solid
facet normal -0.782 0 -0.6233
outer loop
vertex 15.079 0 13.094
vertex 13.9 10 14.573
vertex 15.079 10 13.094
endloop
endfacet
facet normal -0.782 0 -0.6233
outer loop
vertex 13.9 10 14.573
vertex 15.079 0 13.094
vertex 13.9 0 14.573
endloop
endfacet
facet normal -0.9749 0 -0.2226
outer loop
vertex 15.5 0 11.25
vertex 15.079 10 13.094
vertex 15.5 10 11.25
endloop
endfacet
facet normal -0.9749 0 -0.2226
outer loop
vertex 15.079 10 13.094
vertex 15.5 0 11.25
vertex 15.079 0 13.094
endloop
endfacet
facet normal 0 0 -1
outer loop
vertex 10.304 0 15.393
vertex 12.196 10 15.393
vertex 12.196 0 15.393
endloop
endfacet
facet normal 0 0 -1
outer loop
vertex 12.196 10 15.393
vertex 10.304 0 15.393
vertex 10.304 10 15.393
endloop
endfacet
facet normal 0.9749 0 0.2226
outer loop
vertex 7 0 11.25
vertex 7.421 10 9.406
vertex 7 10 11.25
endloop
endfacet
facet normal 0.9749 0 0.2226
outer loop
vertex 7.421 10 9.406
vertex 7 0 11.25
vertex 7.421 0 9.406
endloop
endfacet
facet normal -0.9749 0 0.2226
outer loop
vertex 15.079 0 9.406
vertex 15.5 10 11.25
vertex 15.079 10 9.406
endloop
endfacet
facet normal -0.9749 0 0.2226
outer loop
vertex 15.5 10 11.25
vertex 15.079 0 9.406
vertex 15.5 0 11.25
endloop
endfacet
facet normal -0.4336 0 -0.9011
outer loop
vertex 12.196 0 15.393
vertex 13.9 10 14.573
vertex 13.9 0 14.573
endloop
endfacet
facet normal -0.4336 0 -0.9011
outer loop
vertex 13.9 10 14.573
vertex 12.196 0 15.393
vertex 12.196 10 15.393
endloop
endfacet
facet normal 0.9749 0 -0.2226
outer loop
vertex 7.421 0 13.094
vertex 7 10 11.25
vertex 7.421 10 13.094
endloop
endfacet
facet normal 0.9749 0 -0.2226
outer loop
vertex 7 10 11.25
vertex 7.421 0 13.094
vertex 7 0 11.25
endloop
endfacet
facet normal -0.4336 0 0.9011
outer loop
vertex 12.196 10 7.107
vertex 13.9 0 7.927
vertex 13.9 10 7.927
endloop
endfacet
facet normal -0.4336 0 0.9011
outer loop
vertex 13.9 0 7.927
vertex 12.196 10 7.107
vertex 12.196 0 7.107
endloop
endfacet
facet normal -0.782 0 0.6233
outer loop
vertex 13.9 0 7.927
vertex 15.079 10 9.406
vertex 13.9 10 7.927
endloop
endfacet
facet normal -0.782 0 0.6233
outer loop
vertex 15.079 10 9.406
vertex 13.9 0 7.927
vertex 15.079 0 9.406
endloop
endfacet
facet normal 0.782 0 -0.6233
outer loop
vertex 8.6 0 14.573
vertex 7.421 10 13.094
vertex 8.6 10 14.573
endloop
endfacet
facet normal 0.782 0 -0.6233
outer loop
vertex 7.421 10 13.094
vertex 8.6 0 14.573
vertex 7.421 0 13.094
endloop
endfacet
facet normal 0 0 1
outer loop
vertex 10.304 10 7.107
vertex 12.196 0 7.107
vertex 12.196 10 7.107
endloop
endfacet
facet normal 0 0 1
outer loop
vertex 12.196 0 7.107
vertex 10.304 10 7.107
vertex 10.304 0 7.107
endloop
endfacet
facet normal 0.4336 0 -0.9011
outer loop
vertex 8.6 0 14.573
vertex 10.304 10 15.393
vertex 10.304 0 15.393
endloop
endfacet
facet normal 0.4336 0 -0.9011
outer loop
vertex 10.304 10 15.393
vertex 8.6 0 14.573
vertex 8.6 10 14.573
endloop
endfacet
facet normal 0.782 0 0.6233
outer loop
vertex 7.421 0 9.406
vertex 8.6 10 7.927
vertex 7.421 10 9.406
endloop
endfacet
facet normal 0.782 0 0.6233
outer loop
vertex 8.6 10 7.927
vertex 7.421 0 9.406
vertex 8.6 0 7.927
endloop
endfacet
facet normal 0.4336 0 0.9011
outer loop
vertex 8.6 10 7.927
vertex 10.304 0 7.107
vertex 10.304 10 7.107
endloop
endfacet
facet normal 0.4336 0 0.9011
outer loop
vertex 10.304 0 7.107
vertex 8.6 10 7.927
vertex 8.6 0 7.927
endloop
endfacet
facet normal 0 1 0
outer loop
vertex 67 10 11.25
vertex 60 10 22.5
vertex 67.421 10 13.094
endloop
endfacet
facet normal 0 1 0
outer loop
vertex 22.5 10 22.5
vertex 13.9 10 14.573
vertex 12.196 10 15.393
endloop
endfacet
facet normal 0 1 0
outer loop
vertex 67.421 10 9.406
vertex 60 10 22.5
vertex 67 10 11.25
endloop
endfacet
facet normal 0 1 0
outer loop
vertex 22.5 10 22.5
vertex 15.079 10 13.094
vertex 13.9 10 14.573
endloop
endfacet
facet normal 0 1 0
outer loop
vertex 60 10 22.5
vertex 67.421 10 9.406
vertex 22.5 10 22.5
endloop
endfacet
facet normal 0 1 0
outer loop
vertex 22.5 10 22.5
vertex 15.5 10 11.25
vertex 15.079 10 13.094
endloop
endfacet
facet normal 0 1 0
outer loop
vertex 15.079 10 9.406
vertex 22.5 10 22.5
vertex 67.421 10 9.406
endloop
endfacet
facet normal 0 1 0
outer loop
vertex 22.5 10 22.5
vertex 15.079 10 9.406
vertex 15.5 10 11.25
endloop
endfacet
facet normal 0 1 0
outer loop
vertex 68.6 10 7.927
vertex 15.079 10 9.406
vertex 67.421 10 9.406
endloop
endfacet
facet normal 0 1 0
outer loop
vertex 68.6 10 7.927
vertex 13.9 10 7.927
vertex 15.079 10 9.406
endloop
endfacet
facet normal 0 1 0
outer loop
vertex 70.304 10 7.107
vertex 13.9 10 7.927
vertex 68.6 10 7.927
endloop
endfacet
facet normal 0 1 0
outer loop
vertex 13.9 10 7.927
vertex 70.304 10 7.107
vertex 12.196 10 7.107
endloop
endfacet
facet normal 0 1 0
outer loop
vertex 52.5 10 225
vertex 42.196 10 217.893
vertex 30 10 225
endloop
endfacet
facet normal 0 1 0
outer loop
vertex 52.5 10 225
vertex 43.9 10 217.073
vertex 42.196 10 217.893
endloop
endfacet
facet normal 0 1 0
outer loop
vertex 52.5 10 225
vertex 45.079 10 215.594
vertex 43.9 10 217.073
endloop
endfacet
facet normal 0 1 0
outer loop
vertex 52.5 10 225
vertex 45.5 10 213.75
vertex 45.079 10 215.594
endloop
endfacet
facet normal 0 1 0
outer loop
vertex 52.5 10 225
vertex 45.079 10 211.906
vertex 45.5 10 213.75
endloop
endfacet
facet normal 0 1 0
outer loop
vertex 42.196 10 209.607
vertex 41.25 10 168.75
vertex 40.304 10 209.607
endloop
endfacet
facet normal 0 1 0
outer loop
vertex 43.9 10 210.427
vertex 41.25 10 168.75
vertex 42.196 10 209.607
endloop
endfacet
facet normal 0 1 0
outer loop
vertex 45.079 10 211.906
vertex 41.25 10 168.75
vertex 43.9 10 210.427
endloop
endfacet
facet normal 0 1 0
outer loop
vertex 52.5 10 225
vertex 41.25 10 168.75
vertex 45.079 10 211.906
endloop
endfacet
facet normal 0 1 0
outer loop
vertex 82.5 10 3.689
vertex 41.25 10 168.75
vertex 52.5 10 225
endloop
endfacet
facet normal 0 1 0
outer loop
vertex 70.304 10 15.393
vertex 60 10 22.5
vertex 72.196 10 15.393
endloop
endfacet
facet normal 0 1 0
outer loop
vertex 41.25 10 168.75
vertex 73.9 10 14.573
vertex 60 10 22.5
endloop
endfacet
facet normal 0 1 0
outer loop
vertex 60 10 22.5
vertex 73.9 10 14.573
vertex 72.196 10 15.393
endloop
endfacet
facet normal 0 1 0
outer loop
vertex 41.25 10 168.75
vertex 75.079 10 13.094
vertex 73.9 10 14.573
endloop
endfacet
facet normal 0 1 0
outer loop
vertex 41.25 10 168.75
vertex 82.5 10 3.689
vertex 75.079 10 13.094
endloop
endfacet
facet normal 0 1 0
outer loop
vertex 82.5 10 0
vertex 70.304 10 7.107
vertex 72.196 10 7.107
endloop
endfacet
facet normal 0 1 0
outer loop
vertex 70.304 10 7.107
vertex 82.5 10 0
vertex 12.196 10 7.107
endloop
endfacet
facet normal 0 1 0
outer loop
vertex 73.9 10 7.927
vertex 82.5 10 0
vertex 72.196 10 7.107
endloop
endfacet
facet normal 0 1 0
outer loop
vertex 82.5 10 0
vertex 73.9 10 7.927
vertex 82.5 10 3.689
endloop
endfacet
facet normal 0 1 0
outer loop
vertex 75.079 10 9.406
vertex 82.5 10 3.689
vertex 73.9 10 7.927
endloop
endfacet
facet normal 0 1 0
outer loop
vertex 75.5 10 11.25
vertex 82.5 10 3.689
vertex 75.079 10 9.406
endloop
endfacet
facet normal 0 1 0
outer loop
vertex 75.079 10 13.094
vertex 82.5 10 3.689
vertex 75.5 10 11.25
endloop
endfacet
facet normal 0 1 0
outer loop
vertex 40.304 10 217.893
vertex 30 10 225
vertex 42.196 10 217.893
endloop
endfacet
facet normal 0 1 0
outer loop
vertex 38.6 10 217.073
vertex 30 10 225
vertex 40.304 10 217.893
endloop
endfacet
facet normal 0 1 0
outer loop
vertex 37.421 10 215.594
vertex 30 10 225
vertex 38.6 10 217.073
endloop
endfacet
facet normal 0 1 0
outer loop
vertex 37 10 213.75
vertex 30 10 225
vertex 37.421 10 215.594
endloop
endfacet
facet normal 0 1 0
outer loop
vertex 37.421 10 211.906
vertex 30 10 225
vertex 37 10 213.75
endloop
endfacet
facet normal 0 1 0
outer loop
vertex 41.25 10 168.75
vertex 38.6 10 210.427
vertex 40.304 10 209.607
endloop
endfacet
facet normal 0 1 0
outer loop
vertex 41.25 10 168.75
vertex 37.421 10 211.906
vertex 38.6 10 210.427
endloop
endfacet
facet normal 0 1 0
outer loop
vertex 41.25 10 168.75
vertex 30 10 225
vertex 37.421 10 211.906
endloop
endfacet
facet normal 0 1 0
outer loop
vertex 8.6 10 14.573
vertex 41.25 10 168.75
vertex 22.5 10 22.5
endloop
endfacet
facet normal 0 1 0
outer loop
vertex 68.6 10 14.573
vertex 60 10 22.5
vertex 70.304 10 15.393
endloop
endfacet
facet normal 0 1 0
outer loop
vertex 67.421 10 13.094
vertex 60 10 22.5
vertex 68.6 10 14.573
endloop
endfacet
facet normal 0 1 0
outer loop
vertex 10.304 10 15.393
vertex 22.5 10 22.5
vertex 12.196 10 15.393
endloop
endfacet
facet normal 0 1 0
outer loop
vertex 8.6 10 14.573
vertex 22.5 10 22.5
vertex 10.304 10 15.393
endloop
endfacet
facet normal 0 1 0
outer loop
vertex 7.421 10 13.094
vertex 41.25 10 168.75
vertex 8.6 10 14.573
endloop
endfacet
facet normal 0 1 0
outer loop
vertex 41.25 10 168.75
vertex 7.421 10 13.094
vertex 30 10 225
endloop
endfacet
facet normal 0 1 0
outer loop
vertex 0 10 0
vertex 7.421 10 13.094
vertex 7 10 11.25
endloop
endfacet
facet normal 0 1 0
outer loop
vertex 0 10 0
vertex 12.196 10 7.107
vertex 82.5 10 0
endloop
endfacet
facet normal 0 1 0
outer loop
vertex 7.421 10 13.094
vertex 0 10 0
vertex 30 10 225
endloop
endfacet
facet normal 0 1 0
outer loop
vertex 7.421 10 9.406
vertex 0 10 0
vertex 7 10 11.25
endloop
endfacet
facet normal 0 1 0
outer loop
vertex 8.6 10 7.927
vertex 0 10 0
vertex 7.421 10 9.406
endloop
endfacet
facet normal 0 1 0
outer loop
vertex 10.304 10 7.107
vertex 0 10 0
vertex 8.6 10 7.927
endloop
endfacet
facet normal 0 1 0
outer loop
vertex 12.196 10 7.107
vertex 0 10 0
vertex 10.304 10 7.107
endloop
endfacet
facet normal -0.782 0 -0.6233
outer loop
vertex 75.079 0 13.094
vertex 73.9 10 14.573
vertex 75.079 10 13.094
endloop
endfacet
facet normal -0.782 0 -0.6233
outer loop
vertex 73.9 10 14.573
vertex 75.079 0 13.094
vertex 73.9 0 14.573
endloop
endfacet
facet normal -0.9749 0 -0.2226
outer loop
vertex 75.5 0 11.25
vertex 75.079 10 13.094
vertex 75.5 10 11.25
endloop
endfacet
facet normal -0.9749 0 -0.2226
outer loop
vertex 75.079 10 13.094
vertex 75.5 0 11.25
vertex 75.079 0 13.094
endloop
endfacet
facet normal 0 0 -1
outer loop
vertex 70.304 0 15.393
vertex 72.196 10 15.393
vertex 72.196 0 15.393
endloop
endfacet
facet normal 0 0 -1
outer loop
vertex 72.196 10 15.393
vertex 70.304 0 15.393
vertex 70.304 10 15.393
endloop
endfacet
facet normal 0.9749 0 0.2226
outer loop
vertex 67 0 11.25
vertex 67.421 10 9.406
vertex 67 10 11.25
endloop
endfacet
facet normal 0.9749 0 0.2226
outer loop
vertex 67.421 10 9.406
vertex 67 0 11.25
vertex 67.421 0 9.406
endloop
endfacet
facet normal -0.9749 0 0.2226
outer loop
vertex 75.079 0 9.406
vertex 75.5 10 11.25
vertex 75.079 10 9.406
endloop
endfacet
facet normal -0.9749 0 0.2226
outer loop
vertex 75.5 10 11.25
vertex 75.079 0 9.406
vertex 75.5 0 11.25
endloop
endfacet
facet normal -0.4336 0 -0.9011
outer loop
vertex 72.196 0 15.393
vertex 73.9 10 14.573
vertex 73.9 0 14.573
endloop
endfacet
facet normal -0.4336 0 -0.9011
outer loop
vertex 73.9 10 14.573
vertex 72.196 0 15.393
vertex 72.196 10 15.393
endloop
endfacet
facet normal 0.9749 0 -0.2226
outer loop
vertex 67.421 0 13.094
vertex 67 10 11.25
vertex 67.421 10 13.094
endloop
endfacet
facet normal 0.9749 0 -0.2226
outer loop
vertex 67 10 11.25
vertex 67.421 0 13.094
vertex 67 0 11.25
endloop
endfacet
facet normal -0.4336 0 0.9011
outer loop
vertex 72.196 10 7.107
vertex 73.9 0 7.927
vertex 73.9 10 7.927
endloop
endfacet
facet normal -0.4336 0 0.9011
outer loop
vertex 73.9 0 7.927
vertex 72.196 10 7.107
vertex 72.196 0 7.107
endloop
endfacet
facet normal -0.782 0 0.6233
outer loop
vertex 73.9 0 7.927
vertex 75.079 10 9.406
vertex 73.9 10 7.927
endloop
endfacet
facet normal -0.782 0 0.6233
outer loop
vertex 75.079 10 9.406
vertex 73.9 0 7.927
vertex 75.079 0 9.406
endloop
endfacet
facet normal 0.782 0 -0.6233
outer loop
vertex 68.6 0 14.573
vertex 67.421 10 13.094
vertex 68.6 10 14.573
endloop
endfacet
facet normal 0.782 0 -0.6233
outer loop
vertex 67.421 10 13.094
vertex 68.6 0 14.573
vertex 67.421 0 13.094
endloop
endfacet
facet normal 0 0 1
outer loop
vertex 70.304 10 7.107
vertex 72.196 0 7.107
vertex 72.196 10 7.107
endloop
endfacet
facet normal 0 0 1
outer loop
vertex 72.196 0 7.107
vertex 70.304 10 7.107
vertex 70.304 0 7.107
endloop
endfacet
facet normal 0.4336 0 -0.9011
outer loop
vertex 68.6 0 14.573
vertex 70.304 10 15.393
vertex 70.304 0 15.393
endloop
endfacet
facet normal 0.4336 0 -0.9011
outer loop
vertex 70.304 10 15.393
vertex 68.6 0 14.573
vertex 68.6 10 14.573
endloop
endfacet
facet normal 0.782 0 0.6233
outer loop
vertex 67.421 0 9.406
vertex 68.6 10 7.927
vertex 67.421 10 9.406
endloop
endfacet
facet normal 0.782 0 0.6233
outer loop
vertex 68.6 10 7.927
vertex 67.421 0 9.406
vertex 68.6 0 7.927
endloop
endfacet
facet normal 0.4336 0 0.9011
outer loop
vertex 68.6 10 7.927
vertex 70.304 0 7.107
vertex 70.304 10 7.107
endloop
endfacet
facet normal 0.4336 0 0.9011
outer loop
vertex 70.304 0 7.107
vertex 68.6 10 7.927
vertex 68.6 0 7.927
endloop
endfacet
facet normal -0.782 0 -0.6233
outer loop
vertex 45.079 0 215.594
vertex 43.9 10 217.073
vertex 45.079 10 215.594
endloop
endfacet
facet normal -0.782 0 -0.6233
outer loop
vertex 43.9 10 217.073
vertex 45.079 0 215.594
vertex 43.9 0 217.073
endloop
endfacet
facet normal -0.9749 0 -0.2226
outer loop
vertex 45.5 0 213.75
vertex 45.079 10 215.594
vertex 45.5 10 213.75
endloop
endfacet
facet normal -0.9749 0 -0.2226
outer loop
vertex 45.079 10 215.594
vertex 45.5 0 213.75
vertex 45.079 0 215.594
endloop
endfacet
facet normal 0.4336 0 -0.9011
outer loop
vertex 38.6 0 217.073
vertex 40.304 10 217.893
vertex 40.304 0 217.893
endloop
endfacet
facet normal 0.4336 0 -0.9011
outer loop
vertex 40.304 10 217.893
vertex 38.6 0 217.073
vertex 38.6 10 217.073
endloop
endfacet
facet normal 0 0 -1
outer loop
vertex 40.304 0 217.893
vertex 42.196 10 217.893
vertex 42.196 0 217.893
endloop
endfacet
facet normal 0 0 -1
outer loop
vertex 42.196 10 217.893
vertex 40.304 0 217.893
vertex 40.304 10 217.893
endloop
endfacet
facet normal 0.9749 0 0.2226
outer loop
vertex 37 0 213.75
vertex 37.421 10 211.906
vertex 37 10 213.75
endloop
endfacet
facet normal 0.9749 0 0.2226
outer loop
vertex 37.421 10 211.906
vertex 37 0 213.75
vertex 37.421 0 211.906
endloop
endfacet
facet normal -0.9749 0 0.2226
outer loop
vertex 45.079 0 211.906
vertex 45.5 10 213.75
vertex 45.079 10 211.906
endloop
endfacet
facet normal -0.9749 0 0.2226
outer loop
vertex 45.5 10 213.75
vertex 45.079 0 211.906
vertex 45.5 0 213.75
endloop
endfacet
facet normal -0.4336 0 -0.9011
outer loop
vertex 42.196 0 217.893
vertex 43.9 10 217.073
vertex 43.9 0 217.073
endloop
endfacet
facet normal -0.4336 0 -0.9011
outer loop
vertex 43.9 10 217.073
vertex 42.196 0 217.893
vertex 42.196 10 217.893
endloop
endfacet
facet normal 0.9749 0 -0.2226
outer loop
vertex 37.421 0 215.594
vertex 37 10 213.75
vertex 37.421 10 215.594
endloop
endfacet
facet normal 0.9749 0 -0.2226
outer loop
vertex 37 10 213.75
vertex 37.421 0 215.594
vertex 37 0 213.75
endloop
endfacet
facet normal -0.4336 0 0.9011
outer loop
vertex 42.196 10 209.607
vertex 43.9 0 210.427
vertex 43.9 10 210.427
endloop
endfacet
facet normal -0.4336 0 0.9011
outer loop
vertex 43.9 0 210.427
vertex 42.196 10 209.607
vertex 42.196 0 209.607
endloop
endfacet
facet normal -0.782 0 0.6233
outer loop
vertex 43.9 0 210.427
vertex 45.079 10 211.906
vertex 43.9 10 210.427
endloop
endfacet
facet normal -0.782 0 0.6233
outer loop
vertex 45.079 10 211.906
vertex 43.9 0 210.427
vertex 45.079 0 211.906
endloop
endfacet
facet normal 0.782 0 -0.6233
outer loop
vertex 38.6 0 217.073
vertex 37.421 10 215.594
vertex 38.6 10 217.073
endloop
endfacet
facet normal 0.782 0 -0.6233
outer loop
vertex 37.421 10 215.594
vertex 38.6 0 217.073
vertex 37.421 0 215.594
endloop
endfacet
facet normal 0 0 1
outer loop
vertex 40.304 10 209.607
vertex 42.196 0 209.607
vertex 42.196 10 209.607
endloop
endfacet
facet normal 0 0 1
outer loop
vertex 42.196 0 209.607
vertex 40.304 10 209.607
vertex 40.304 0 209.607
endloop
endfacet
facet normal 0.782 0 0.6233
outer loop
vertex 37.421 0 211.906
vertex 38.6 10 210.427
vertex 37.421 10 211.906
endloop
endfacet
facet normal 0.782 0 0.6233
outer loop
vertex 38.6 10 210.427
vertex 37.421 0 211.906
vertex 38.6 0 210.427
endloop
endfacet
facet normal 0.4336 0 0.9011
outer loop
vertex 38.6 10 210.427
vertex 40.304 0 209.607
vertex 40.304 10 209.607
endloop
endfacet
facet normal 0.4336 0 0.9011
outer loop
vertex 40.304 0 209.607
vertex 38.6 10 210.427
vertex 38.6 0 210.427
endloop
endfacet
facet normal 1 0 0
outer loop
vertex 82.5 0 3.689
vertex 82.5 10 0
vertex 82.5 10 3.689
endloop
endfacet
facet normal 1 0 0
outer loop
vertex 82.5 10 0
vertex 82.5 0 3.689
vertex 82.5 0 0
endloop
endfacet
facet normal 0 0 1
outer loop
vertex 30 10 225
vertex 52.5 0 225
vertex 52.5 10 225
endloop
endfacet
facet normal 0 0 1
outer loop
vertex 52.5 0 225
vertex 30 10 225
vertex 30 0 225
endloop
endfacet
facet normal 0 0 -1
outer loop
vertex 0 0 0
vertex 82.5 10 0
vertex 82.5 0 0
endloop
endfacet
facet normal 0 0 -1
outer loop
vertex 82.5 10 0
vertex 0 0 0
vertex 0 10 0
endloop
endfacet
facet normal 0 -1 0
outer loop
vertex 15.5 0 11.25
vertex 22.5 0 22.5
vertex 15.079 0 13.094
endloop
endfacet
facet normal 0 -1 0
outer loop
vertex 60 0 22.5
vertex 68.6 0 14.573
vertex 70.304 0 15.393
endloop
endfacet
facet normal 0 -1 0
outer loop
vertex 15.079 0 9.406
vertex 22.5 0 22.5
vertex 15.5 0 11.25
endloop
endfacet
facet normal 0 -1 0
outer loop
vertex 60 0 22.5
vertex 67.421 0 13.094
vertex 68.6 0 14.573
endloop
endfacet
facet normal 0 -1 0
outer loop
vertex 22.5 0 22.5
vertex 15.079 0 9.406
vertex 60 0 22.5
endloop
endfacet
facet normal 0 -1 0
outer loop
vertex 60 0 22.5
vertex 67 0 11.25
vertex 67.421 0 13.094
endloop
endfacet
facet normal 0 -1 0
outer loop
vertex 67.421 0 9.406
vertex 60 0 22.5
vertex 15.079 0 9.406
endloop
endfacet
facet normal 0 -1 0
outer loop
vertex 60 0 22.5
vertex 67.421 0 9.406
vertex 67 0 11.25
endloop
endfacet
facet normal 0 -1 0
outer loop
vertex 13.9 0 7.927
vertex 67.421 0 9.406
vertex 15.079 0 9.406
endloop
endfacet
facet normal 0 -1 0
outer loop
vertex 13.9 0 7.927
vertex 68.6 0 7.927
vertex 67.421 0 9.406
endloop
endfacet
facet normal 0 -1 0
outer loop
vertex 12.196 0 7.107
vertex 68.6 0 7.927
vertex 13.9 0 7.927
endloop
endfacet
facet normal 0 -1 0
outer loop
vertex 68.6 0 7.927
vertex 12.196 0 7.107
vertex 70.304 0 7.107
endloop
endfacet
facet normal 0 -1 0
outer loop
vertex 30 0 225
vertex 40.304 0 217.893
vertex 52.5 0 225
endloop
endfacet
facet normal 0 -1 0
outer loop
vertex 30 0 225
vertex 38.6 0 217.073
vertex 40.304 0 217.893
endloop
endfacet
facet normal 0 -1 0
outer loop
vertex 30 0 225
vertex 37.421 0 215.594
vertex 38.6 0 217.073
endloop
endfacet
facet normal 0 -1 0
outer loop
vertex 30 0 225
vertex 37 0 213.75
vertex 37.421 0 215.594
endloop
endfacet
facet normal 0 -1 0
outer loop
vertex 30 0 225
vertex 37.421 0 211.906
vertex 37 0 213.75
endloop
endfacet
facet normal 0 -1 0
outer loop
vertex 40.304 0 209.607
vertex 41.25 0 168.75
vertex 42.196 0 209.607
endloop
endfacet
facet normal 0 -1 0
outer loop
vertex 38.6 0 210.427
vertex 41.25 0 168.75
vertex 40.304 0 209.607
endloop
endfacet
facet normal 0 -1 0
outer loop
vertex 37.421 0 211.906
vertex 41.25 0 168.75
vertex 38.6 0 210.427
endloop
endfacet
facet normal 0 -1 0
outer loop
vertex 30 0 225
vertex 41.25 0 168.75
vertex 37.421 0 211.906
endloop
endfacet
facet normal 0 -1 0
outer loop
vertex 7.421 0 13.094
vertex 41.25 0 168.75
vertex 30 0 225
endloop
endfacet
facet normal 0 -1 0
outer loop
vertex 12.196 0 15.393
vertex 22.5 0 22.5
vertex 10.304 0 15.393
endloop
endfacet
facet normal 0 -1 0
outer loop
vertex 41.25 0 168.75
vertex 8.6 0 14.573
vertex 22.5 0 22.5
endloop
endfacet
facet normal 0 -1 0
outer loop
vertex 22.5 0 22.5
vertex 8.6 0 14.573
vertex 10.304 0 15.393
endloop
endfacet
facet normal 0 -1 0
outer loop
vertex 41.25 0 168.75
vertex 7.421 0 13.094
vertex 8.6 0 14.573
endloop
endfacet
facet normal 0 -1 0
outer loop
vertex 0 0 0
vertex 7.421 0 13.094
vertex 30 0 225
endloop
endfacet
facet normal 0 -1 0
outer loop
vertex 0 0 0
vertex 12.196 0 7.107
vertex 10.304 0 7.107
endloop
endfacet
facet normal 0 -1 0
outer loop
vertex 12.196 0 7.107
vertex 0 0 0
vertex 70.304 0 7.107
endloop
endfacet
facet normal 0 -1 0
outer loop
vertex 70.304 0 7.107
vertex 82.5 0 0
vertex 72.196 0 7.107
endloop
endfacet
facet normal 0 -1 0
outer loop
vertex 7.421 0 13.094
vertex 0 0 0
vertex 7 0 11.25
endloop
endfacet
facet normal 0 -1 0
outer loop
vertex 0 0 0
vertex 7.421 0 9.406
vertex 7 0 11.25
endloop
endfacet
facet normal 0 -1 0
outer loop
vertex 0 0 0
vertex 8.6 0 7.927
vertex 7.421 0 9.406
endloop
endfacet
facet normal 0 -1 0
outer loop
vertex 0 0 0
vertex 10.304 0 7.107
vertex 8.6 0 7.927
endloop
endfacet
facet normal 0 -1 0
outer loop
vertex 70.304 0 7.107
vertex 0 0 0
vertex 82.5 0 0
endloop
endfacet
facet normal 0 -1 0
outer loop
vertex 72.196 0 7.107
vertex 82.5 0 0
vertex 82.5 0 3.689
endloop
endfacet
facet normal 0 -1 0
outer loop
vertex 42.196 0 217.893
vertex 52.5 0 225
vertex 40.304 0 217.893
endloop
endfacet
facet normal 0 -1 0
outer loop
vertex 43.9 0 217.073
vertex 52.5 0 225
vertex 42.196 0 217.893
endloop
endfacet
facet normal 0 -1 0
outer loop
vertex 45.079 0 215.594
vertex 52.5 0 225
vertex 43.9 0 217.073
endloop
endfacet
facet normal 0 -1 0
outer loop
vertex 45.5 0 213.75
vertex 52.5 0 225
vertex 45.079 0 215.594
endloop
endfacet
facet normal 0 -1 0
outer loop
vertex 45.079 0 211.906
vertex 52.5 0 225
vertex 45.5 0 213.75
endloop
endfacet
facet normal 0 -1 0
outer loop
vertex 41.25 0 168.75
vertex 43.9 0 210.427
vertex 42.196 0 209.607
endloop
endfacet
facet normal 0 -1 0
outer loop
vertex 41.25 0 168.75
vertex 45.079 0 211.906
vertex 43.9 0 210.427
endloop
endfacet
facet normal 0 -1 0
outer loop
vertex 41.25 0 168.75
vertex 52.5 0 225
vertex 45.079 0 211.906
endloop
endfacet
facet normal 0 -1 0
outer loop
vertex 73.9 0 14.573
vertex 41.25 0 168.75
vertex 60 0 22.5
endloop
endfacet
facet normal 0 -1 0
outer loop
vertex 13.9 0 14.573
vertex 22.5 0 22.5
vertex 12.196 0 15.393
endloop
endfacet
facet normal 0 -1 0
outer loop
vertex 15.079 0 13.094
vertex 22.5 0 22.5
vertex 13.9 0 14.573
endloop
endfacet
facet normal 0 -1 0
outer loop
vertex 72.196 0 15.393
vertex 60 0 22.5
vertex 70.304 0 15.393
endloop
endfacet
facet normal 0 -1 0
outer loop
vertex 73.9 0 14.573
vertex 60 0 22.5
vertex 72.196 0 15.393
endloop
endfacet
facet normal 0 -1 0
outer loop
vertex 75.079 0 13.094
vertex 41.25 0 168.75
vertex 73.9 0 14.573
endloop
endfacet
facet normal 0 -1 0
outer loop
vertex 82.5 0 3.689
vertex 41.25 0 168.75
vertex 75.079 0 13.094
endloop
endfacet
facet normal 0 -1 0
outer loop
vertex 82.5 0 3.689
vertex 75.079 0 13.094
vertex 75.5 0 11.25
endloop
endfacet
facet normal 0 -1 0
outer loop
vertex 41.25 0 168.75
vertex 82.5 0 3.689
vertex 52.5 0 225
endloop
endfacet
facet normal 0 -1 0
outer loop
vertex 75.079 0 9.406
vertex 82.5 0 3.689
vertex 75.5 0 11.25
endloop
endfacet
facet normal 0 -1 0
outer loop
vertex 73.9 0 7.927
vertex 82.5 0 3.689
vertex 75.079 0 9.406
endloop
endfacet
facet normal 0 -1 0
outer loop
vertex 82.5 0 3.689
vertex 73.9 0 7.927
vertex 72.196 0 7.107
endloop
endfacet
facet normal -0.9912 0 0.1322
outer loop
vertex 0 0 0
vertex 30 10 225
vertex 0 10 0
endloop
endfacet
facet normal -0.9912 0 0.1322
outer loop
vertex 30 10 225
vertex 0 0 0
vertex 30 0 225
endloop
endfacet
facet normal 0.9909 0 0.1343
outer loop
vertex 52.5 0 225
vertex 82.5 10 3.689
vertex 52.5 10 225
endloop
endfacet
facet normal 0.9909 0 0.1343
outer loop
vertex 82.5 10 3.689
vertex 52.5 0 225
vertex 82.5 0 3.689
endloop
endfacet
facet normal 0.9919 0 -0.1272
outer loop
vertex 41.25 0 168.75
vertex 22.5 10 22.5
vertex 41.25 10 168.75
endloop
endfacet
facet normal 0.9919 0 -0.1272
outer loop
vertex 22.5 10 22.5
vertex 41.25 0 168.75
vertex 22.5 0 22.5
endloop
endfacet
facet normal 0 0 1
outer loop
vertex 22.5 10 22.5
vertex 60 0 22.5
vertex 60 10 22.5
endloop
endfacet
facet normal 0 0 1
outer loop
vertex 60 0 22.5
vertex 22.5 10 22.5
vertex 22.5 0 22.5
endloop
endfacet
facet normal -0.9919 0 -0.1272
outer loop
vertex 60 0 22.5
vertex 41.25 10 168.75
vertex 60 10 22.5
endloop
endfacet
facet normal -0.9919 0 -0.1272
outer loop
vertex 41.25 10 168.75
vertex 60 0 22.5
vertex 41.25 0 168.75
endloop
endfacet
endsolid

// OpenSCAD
thickness = 10;
height = 225;
pad = 7;
tolerance = 0.5;
hole_distance = 60;
desired_radius = 4;
radius = desired_radius+tolerance/2;
x1 = pad + radius;
center_x = x1 + (hole_distance/2);
hole_z = x1;
x2 = x1 + hole_distance;
width = x2 + radius + pad;
module hole(x, z) {
    translate([x, thickness, z]) rotate([90, 0, 0])
        cylinder(h=height, r=radius);
}
difference() {
    difference() {
        cube([width, thickness, height]);
         union() {
            hole(x1, hole_z);
            hole(x2, hole_z);
            hole(center_x, height - pad - radius);
        }
    }
    rotate([90, 0, 0])
            translate([0, 0, -thickness])
                linear_extrude(height = thickness) {
                    offset = pad + radius;
                    polygon([[0, height], [center_x - offset, height], 
                        [0, 0]]);
                    polygon([[center_x + offset, height], 
                    [width + tolerance, height], [width + tolerance, 0]]);
                    cpad = 2*offset;
                    y=cpad;
                    polygon([[center_x, 3*height/4],
                        [cpad, y], [width-cpad, y]]);
                }
}
